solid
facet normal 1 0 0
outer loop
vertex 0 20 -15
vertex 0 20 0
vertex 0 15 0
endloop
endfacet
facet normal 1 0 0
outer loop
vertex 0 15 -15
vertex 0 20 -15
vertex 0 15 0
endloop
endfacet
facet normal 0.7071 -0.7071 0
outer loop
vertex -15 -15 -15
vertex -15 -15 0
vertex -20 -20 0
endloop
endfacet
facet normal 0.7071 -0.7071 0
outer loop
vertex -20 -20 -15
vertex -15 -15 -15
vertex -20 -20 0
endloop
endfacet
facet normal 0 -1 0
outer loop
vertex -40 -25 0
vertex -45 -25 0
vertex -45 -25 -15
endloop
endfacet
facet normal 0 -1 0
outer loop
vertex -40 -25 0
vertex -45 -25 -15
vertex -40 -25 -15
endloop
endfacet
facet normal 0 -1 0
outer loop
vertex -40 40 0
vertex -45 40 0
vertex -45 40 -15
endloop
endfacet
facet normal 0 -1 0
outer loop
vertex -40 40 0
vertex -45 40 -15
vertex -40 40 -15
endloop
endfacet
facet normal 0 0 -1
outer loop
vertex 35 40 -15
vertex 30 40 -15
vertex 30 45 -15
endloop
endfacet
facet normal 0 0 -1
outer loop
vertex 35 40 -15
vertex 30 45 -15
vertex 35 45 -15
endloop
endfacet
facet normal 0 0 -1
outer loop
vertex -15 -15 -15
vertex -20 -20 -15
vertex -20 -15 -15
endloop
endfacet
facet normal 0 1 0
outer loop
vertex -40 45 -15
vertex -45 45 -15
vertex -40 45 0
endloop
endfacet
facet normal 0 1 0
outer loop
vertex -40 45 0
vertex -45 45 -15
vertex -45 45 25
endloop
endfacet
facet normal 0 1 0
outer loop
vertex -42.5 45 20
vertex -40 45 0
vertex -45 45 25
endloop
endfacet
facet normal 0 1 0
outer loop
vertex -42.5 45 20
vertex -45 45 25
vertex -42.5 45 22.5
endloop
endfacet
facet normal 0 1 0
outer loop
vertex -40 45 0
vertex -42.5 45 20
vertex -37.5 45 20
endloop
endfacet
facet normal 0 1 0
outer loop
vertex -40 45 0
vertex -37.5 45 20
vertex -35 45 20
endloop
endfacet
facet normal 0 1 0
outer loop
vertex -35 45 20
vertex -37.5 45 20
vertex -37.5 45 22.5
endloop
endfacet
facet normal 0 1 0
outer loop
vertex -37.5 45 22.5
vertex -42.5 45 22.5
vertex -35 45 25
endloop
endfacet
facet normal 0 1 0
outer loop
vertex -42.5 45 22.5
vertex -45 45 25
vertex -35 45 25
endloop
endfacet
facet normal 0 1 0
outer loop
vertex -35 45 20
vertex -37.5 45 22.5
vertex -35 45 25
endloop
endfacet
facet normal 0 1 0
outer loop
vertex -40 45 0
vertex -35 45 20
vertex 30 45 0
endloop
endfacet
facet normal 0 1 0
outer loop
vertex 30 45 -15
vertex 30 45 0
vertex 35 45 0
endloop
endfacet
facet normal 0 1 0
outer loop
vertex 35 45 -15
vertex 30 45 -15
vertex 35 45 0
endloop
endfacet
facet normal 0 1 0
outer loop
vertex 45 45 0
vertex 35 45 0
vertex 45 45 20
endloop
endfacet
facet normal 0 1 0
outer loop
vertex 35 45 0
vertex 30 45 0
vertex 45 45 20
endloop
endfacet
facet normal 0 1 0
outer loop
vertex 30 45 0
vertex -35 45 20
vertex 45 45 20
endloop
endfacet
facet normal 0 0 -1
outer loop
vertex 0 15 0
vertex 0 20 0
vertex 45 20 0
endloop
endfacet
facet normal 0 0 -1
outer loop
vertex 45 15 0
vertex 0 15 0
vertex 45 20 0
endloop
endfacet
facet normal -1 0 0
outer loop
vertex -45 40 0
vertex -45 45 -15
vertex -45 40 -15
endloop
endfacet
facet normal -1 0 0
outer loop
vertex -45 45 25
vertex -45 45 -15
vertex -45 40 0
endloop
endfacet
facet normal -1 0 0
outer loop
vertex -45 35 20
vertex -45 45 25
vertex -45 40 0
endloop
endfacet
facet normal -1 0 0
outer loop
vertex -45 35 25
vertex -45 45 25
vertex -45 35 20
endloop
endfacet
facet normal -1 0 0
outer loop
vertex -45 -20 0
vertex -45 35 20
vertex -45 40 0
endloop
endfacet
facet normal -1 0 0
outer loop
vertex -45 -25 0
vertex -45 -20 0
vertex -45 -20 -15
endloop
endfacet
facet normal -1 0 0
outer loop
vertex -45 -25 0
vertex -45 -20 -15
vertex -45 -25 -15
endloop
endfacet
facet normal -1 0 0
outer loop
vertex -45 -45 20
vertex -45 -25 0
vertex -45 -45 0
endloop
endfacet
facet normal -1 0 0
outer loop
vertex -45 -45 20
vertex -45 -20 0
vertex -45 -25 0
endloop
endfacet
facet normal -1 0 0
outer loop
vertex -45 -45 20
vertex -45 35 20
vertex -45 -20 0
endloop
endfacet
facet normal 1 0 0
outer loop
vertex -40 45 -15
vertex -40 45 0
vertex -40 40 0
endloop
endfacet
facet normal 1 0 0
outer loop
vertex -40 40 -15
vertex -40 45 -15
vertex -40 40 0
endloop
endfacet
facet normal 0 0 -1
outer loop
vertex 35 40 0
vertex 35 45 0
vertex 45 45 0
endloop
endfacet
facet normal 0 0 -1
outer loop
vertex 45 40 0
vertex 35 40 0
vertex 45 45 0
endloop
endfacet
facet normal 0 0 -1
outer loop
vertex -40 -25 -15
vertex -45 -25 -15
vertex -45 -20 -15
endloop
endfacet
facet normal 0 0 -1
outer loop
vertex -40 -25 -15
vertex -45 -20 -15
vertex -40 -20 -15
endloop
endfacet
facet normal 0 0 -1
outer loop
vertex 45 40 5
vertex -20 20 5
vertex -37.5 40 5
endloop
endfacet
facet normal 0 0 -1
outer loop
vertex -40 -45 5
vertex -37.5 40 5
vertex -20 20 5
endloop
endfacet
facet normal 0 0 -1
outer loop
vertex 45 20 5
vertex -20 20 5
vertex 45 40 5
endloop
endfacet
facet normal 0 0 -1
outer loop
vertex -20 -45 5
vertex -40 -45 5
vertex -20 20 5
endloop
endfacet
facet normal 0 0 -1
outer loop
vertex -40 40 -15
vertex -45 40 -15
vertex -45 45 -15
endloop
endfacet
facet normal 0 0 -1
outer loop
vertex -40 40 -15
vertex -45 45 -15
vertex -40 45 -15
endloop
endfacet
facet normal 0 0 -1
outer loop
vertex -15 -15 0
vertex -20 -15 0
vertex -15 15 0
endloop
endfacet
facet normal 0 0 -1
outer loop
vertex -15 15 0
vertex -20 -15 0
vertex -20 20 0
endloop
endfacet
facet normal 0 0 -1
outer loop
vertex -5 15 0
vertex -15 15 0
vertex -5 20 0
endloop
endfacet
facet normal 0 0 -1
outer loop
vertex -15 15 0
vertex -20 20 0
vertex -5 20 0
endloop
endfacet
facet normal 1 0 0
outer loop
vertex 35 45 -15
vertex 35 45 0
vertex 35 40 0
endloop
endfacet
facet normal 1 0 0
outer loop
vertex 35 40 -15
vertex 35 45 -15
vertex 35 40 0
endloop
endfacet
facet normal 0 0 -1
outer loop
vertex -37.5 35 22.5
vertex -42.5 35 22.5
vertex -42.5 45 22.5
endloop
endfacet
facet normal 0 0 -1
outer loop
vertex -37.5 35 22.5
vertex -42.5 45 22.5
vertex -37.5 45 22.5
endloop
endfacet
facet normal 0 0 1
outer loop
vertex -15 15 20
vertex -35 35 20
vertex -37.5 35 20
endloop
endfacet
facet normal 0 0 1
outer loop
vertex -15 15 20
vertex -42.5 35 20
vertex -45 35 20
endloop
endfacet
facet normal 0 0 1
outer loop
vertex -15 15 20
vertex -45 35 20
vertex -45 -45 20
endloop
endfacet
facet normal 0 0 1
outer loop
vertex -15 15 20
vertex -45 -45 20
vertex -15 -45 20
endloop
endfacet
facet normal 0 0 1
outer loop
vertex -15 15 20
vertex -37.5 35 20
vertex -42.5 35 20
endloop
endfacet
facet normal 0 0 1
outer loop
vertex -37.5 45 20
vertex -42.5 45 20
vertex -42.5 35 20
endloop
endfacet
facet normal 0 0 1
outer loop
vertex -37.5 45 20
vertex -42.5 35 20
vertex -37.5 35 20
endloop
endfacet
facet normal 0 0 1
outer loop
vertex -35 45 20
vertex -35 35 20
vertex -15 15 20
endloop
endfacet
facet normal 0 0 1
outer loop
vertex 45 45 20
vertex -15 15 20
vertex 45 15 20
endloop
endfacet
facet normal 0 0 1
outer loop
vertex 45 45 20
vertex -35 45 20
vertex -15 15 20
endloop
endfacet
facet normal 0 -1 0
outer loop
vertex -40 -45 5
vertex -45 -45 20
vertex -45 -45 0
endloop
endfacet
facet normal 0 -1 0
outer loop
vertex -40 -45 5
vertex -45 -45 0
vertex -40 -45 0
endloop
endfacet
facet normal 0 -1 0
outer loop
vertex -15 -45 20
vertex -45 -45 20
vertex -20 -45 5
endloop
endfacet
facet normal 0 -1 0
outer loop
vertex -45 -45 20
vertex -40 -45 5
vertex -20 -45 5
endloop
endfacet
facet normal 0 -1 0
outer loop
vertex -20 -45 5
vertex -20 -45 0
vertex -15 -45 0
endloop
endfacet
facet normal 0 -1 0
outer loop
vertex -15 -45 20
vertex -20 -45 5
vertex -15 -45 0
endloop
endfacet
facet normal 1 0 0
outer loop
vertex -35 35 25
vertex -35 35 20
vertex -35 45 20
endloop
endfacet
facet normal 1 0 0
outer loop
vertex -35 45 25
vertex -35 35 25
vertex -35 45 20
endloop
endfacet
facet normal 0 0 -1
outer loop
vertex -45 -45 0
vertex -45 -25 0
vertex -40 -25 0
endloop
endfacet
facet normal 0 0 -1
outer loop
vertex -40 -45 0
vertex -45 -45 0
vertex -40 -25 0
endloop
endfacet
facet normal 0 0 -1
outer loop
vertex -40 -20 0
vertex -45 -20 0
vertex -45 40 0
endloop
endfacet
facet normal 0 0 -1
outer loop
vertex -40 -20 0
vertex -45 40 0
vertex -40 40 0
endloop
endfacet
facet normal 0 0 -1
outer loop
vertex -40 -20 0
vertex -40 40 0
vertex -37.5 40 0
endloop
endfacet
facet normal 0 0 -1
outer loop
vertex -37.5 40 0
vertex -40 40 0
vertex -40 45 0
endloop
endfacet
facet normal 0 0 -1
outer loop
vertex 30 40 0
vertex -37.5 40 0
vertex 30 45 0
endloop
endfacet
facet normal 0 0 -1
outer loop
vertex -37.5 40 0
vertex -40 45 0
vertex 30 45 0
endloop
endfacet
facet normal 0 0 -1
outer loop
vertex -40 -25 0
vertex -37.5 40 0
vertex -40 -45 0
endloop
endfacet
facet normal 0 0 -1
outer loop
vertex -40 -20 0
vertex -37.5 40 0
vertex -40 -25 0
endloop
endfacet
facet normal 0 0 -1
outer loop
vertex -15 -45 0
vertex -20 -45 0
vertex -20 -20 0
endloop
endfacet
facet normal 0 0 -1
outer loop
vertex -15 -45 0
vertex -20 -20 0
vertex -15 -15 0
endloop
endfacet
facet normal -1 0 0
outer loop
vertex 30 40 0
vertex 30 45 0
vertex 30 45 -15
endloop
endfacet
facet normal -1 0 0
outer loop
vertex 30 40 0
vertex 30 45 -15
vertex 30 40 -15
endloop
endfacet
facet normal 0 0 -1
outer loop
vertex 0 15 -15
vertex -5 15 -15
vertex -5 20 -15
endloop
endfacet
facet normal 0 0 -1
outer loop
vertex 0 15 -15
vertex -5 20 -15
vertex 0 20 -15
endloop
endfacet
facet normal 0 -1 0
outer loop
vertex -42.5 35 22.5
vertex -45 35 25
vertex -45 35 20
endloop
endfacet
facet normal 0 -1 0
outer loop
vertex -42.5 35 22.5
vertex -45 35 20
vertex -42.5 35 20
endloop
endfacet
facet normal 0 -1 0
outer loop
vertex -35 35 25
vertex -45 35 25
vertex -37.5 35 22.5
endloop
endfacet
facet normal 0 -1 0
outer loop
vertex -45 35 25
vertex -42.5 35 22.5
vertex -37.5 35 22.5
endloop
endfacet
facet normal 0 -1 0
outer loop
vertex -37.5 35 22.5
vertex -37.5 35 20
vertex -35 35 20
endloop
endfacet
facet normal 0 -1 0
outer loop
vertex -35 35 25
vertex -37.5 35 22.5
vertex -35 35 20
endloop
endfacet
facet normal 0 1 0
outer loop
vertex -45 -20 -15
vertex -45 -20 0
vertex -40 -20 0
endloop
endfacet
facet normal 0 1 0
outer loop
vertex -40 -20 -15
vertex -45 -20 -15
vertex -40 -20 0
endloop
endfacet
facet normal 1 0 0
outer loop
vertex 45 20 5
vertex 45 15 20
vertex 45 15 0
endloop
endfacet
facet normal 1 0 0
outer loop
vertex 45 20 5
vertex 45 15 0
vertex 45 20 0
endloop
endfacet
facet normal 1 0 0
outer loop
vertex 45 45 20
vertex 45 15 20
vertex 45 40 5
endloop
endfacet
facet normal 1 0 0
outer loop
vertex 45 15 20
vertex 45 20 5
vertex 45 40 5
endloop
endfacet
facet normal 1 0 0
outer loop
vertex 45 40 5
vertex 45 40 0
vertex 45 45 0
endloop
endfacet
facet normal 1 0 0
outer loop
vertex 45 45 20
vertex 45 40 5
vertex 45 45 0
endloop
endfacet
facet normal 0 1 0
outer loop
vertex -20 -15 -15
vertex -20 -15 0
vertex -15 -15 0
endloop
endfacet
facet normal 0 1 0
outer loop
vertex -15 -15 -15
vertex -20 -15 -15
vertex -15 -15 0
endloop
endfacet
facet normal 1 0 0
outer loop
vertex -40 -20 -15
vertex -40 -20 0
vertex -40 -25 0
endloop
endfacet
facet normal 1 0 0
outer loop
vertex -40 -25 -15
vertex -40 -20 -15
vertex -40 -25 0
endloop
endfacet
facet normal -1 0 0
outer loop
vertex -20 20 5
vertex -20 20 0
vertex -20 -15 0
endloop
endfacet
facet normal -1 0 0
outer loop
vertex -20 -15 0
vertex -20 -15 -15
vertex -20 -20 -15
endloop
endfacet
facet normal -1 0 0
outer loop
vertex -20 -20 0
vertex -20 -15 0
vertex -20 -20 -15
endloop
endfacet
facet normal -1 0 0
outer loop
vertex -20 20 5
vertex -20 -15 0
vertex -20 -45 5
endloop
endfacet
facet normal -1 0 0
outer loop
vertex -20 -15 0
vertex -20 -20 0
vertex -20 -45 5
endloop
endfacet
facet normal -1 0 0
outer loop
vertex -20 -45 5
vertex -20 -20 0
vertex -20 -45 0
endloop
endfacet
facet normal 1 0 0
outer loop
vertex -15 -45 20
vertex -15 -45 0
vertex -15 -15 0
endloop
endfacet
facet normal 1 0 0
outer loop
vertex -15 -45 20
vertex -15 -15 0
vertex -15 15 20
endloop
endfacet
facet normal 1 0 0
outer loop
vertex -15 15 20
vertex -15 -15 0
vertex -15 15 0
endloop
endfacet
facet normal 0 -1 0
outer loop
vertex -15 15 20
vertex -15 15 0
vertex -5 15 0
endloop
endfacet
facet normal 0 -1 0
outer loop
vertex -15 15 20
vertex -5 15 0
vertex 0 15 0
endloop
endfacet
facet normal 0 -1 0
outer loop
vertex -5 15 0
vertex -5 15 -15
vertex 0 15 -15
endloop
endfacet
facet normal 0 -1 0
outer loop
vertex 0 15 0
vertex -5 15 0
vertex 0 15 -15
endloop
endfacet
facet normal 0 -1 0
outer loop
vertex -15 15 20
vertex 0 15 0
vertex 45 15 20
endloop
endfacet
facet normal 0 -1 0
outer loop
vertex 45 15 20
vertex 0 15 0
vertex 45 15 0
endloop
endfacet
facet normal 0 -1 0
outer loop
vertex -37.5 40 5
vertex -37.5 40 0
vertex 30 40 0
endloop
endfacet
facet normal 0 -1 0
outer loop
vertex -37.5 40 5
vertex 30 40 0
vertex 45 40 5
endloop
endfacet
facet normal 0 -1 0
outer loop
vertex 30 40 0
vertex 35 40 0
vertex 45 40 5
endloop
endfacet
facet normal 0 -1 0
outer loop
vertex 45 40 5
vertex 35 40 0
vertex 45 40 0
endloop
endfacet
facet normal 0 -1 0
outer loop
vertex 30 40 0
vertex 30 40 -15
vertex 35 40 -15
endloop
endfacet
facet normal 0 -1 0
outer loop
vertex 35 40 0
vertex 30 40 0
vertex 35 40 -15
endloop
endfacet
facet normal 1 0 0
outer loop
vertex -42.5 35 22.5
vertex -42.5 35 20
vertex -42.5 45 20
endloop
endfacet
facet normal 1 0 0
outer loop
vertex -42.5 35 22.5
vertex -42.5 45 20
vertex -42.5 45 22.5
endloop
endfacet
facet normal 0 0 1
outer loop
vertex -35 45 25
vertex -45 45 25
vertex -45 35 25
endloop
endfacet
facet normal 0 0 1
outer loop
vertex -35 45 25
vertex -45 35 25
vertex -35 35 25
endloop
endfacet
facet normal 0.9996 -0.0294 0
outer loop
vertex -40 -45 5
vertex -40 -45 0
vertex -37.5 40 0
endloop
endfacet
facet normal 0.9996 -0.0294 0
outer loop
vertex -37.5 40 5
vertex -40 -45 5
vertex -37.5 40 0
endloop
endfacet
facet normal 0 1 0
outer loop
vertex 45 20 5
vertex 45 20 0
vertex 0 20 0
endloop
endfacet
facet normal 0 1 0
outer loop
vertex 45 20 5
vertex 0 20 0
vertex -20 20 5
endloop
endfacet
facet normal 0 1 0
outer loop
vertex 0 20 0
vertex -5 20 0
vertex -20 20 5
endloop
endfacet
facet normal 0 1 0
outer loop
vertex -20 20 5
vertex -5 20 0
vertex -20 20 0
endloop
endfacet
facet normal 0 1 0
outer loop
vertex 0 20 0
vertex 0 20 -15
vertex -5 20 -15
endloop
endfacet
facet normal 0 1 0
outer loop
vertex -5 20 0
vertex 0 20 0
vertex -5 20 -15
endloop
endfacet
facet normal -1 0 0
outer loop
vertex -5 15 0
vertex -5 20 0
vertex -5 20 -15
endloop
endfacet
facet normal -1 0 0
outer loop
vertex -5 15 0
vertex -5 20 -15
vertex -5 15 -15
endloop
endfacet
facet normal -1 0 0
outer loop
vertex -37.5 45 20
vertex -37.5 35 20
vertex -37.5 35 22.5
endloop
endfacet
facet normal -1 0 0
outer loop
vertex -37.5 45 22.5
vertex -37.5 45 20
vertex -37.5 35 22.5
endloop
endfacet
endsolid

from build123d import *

# Parameters (mm, degrees)
F0_W      = 60
F0_H      = 30
F0_W_2    = 30
F0_H_2    = 60
F1_DEPTH  = 20
F3_DEPTH  = 5
F4_W      = 5
F4_H      = 5
F5_DEPTH  = 15
F6_W      = 5
F6_H      = 5
F7_DEPTH  = 15
F8_DEPTH  = 15
F9_W      = 5
F9_H      = 5
F10_DEPTH = 15
F11_W     = 10
F11_H     = 10
F12_DEPTH = 5
F13_W     = 5
F13_H     = 2.5
F14_DEPTH = 40
F15_DEPTH = 15


# Not quite as in the source:
# - a feature names something its author has since deleted; it is built from what else it names


with BuildPart() as f1:
    # F0 (on Top) → F1 (new body)
    with BuildSketch(Plane.XY):
        with Locations((15, 30)):
            Rectangle(F0_W, F0_H)
        with Locations((-30, 30)):
            Rectangle(F0_W_2, F0_H)
        with Locations((-30, -15)):
            Rectangle(F0_W_2, F0_H_2)
    extrude(amount=F1_DEPTH)

    # F2 (on face) → F3 (cut)
    with BuildSketch(Plane(origin=(0, 0, 0), x_dir=(1, 0, 0), z_dir=(0, 0, -1))):
        Polygon((-13.218164444, -40), (45, -40), (45, -20), (-15, -20), (-20, -20), (-20, -15), (-20, 3.0019930564), (-20, 45), (-40, 45), (-37.5, -40), align=None)
    extrude(amount=-F3_DEPTH, mode=Mode.SUBTRACT)

    # F4 (on face) → F5 (join)
    with BuildSketch(Plane(origin=(0, 0, 0), x_dir=(1, 0, 0), z_dir=(0, 0, -1))):
        with Locations((32.5, -42.5)):
            Rectangle(F4_W, F4_H)
    extrude(amount=F5_DEPTH)

    # F6 (on face) → F7 (join)
    with BuildSketch(Plane(origin=(0, 0, 0), x_dir=(1, 0, 0), z_dir=(0, 0, -1))):
        with Locations((-2.5, -17.5)):
            Rectangle(F6_W, F6_H)
    extrude(amount=F7_DEPTH)

    # F6 (on face) → F8 (join)
    with BuildSketch(Plane(origin=(0, 0, 0), x_dir=(1, 0, 0), z_dir=(0, 0, -1))):
        Polygon((-20, 20), (-20, 15), (-15, 15), align=None)
    extrude(amount=F8_DEPTH)

    # F9 (on face) → F10 (join)
    with BuildSketch(Plane(origin=(0, 0, 0), x_dir=(1, 0, 0), z_dir=(0, 0, -1))):
        with Locations((-42.5, 22.5)):
            Rectangle(F9_W, F9_H)
    extrude(amount=F10_DEPTH)

    # F11 (on face) → F12 (join)
    with BuildSketch(Plane.XY.offset(20)):
        with Locations((-40, 40)):
            Rectangle(F11_W, F11_H)
    extrude(amount=F12_DEPTH)

    # F13 (on face) → F14 (cut)
    with BuildSketch(Plane.XZ.offset(-35)):
        with Locations((-40, 21.25)):
            Rectangle(F13_W, F13_H)
    extrude(amount=-F14_DEPTH, mode=Mode.SUBTRACT)

    # F4 (on face) → F15 (join)
    with BuildSketch(Plane(origin=(0, 0, 0), x_dir=(1, 0, 0), z_dir=(0, 0, -1))):
        with Locations((-42.5, -42.5)):
            Rectangle(F4_W, F4_H)
    extrude(amount=F15_DEPTH)


solid = f1.part
